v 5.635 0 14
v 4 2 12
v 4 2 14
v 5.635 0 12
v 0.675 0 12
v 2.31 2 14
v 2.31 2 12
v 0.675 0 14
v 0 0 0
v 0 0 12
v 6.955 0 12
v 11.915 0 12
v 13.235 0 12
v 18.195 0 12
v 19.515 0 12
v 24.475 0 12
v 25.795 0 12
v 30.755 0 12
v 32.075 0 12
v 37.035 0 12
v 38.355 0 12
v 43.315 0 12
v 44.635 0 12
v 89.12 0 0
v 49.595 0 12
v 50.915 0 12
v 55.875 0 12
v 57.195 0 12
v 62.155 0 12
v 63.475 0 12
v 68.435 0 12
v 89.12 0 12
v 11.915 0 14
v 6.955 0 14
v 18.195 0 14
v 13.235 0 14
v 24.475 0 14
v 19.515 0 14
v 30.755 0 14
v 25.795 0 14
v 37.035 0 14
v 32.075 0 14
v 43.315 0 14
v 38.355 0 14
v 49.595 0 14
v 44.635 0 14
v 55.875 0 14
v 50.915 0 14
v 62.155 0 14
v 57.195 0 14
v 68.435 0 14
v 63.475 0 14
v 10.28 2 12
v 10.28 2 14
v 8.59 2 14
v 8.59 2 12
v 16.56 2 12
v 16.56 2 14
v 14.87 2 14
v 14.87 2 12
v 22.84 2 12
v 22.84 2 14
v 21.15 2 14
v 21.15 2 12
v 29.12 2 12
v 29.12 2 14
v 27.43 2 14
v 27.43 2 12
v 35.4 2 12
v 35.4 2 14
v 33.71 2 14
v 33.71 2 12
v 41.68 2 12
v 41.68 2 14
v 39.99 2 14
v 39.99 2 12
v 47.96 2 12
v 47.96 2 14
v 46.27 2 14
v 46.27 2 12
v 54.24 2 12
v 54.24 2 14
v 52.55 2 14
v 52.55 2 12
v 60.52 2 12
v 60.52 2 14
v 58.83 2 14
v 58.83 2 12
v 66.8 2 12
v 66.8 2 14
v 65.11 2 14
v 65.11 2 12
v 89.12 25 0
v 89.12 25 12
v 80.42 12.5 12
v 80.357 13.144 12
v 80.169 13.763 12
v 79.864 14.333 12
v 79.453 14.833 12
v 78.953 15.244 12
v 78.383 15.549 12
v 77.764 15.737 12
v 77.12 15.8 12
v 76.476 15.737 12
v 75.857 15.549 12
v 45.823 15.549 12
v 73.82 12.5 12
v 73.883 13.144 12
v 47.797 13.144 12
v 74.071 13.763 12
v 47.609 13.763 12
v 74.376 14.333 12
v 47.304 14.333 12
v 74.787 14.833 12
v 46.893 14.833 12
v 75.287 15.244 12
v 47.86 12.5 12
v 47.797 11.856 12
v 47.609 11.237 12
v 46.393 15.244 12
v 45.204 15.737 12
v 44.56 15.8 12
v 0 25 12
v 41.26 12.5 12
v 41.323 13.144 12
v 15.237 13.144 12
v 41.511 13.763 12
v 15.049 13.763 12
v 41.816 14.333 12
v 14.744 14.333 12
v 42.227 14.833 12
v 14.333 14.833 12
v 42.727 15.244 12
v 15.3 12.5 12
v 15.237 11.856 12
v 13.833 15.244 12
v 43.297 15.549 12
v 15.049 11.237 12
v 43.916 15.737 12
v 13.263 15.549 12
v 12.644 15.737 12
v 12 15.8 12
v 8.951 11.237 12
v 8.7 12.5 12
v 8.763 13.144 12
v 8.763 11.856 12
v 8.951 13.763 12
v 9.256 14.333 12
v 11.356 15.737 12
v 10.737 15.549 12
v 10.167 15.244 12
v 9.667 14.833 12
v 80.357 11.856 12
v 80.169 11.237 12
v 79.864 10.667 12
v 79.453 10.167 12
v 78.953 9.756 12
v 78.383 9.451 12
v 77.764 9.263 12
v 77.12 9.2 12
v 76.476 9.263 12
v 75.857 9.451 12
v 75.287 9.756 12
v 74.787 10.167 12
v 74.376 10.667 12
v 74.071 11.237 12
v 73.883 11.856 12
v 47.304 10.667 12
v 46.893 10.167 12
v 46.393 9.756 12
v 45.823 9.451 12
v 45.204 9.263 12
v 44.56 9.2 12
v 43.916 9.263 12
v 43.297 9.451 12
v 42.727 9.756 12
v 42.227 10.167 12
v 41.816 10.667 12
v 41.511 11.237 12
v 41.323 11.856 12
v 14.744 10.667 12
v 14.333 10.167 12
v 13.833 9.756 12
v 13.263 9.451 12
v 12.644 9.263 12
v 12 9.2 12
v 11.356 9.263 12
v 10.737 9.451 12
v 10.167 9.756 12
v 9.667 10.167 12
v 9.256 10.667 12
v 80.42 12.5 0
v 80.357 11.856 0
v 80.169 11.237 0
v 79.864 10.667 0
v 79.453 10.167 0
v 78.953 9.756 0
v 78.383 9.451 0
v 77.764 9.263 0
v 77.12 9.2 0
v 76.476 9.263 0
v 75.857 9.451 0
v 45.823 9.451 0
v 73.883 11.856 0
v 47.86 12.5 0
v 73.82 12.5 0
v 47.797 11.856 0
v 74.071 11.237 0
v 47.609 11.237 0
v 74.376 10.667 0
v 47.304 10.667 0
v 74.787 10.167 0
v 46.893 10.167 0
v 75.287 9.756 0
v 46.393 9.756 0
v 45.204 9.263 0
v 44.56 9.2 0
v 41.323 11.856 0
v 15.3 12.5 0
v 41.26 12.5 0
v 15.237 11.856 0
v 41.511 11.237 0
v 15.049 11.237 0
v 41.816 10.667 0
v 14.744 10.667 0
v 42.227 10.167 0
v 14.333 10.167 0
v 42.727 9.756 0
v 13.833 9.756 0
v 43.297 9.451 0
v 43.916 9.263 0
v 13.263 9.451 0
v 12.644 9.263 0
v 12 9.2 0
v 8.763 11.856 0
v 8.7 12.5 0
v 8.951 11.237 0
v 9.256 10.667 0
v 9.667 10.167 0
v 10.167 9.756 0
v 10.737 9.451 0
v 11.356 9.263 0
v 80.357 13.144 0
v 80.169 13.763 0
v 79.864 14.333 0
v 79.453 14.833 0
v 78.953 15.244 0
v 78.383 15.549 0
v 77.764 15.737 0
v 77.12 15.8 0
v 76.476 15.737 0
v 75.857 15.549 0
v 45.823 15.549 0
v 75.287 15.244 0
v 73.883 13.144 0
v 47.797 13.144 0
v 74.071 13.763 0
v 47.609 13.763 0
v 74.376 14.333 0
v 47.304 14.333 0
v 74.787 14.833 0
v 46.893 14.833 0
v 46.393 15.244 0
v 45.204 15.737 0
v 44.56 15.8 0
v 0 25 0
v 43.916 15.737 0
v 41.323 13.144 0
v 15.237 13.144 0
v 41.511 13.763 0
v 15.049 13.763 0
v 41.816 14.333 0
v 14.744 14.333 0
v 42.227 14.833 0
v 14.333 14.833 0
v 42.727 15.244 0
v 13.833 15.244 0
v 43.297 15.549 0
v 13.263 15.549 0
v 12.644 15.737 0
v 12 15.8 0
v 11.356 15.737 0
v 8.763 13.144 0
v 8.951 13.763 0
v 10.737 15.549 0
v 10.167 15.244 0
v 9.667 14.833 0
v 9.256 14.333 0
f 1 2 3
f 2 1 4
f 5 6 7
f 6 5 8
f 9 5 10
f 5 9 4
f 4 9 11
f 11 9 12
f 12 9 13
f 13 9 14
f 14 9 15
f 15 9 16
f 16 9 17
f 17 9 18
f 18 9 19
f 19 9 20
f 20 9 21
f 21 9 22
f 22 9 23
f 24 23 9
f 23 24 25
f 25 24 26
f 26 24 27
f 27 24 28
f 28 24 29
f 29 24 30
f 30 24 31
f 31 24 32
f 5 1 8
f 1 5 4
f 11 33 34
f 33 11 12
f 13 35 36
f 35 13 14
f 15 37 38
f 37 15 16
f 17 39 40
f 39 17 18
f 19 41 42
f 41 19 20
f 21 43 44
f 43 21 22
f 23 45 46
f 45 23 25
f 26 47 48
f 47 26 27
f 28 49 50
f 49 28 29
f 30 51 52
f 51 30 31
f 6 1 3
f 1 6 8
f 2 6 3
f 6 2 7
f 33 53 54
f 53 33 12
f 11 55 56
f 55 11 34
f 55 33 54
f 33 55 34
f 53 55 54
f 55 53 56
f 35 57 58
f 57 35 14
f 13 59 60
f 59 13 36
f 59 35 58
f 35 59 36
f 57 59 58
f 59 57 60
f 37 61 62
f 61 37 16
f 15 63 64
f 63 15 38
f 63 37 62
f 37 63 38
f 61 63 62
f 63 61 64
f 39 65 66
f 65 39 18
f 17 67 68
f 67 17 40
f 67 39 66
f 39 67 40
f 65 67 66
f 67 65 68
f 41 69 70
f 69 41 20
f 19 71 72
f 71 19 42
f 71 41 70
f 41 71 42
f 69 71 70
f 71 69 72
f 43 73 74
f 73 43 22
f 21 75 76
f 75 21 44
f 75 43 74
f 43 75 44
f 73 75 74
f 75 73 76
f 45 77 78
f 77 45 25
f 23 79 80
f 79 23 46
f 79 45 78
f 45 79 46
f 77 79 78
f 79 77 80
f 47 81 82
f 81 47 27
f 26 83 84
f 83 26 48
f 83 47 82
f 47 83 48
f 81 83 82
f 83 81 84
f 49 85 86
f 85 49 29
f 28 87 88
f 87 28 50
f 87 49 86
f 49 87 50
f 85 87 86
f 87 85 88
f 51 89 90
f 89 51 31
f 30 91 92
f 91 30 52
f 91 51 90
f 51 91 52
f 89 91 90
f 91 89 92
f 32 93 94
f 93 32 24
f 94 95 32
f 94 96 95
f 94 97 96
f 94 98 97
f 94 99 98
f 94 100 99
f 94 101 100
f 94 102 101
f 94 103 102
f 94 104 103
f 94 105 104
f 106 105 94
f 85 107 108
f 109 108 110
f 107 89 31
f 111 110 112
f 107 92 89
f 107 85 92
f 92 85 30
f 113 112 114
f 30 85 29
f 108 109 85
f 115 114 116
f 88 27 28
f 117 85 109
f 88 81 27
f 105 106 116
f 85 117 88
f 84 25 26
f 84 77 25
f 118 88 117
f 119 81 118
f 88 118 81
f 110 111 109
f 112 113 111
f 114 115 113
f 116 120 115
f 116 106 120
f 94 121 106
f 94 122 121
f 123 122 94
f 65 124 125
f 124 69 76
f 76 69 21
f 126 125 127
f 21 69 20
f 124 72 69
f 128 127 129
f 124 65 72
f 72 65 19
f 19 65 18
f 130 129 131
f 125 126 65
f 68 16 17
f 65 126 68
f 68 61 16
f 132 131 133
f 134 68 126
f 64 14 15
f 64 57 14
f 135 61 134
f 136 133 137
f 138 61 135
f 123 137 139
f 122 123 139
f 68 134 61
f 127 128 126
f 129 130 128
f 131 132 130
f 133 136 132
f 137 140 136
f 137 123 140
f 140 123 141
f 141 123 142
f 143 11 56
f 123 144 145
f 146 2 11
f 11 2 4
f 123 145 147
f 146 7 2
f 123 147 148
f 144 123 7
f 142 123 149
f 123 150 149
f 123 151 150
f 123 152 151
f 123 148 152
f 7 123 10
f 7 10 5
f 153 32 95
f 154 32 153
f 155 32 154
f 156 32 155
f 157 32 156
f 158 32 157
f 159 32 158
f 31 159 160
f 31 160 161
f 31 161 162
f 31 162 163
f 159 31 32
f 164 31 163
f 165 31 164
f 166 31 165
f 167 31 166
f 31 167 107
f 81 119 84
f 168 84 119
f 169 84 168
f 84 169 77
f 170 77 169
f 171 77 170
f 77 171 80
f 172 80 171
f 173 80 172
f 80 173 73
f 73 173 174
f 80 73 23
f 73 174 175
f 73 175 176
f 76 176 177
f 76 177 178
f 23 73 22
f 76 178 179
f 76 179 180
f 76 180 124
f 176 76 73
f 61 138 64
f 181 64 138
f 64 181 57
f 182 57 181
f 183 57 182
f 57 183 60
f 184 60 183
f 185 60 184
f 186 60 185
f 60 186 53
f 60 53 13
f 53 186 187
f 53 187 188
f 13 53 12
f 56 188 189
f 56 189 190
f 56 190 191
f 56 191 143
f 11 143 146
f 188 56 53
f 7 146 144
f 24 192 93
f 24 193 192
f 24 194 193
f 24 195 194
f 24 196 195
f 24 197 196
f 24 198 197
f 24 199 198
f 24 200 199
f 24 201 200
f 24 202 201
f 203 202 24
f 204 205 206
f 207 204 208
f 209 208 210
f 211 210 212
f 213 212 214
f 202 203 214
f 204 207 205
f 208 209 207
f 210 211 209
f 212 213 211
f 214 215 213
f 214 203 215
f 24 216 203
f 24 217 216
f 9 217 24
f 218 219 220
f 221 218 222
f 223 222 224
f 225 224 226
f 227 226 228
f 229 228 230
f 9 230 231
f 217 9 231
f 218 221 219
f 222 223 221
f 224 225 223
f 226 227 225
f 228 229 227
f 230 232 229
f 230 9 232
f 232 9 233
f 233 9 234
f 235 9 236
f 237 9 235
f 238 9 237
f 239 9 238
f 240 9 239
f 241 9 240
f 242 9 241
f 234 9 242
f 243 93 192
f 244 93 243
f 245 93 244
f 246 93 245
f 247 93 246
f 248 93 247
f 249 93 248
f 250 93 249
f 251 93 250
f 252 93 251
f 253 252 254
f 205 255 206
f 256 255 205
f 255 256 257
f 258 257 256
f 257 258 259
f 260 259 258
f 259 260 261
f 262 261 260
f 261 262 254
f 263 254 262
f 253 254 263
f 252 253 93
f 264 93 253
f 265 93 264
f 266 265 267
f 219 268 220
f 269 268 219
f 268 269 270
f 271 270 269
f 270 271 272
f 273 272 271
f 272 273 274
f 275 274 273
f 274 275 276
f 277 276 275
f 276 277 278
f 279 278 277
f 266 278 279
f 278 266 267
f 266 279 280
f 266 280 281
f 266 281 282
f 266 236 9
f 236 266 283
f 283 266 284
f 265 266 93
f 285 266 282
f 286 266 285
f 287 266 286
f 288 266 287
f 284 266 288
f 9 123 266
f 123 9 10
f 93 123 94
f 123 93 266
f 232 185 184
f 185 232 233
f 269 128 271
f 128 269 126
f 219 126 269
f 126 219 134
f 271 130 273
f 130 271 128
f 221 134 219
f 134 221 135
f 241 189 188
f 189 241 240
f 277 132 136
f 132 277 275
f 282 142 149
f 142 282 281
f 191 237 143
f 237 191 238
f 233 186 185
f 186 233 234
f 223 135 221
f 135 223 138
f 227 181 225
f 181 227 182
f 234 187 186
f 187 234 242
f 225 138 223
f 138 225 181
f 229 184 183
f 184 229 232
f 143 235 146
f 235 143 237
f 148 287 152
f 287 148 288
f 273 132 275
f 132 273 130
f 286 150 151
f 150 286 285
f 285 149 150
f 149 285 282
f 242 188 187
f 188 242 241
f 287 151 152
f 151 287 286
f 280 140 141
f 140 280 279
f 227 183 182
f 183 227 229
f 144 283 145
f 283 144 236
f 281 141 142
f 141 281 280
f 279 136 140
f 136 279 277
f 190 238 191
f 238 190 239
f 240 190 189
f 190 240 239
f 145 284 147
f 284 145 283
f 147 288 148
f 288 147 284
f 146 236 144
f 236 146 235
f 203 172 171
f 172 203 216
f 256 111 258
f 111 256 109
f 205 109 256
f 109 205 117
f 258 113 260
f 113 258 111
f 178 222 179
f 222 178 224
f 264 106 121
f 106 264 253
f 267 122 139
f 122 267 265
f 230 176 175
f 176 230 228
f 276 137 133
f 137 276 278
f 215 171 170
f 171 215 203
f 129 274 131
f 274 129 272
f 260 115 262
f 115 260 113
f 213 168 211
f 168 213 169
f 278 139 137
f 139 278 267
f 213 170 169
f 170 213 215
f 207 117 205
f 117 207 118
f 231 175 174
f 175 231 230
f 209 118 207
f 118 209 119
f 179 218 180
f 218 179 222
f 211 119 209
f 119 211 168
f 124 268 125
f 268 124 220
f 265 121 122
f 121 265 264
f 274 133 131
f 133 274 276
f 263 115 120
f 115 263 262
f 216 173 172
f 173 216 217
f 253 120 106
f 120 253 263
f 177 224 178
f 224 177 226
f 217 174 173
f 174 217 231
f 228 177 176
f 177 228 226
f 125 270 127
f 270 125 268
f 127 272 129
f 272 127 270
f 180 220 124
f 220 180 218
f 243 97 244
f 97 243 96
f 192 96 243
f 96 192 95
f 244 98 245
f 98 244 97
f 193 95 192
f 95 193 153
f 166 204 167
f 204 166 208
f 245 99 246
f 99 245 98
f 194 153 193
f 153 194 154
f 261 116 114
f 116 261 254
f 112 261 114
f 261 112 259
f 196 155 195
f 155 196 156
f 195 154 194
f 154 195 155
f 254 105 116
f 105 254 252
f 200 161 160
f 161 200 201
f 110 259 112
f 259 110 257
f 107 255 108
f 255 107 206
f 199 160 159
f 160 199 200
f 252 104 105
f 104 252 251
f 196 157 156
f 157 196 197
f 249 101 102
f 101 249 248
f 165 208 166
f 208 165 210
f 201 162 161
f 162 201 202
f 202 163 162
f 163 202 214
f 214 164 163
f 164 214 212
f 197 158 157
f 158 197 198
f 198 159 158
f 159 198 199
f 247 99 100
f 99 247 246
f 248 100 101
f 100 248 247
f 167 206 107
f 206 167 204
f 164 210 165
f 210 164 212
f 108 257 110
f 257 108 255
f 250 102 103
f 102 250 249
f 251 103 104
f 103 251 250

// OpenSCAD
$fn = 32;

// ----------------------------------------------------------------------
// Gear rack: m=2 z=11, 89.12 x 25 x 14 mm
// ----------------------------------------------------------------------

// --- parameters (mm) ---
length = 89.12;           // rack length, X
width = 25;               // rack width, Y
height = 14;              // overall height, Z
module_m = 2;             // module
back_t = 12;              // tooth root line height
pitch = 6.28;             // circular pitch
tip_w = 1.69;             // tooth thickness at the tip
root_w = 4.96;            // tooth thickness at the root line
hole_d = 6.6;             // mounting hole
sink = 0.6;               // tooth root overlap into the body

tooth_span = 69.11;

module tooth(x0) {
  /* 20 deg flank profile, sunk into the body for a positive overlap */
  translate([x0, 0, back_t - sink])
    linear_extrude(height = height - back_t + sink)
      polygon(points = [[-root_w / 2, 0], [root_w / 2, 0],
                        [tip_w / 2, height - back_t],
                        [-tip_w / 2, height - back_t]]);
}

difference() {
  union() {
    cube([length, width, back_t]);
    for (i = [0 : 11 - 1])
      tooth((i + 0.5) * pitch + (tooth_span - 11 * pitch) / 2);
  }
  translate([12, 12.5, -1]) cylinder(h = back_t + 2, d = hole_d);
  translate([44.56, 12.5, -1]) cylinder(h = back_t + 2, d = hole_d);
  translate([77.12, 12.5, -1]) cylinder(h = back_t + 2, d = hole_d);
}
